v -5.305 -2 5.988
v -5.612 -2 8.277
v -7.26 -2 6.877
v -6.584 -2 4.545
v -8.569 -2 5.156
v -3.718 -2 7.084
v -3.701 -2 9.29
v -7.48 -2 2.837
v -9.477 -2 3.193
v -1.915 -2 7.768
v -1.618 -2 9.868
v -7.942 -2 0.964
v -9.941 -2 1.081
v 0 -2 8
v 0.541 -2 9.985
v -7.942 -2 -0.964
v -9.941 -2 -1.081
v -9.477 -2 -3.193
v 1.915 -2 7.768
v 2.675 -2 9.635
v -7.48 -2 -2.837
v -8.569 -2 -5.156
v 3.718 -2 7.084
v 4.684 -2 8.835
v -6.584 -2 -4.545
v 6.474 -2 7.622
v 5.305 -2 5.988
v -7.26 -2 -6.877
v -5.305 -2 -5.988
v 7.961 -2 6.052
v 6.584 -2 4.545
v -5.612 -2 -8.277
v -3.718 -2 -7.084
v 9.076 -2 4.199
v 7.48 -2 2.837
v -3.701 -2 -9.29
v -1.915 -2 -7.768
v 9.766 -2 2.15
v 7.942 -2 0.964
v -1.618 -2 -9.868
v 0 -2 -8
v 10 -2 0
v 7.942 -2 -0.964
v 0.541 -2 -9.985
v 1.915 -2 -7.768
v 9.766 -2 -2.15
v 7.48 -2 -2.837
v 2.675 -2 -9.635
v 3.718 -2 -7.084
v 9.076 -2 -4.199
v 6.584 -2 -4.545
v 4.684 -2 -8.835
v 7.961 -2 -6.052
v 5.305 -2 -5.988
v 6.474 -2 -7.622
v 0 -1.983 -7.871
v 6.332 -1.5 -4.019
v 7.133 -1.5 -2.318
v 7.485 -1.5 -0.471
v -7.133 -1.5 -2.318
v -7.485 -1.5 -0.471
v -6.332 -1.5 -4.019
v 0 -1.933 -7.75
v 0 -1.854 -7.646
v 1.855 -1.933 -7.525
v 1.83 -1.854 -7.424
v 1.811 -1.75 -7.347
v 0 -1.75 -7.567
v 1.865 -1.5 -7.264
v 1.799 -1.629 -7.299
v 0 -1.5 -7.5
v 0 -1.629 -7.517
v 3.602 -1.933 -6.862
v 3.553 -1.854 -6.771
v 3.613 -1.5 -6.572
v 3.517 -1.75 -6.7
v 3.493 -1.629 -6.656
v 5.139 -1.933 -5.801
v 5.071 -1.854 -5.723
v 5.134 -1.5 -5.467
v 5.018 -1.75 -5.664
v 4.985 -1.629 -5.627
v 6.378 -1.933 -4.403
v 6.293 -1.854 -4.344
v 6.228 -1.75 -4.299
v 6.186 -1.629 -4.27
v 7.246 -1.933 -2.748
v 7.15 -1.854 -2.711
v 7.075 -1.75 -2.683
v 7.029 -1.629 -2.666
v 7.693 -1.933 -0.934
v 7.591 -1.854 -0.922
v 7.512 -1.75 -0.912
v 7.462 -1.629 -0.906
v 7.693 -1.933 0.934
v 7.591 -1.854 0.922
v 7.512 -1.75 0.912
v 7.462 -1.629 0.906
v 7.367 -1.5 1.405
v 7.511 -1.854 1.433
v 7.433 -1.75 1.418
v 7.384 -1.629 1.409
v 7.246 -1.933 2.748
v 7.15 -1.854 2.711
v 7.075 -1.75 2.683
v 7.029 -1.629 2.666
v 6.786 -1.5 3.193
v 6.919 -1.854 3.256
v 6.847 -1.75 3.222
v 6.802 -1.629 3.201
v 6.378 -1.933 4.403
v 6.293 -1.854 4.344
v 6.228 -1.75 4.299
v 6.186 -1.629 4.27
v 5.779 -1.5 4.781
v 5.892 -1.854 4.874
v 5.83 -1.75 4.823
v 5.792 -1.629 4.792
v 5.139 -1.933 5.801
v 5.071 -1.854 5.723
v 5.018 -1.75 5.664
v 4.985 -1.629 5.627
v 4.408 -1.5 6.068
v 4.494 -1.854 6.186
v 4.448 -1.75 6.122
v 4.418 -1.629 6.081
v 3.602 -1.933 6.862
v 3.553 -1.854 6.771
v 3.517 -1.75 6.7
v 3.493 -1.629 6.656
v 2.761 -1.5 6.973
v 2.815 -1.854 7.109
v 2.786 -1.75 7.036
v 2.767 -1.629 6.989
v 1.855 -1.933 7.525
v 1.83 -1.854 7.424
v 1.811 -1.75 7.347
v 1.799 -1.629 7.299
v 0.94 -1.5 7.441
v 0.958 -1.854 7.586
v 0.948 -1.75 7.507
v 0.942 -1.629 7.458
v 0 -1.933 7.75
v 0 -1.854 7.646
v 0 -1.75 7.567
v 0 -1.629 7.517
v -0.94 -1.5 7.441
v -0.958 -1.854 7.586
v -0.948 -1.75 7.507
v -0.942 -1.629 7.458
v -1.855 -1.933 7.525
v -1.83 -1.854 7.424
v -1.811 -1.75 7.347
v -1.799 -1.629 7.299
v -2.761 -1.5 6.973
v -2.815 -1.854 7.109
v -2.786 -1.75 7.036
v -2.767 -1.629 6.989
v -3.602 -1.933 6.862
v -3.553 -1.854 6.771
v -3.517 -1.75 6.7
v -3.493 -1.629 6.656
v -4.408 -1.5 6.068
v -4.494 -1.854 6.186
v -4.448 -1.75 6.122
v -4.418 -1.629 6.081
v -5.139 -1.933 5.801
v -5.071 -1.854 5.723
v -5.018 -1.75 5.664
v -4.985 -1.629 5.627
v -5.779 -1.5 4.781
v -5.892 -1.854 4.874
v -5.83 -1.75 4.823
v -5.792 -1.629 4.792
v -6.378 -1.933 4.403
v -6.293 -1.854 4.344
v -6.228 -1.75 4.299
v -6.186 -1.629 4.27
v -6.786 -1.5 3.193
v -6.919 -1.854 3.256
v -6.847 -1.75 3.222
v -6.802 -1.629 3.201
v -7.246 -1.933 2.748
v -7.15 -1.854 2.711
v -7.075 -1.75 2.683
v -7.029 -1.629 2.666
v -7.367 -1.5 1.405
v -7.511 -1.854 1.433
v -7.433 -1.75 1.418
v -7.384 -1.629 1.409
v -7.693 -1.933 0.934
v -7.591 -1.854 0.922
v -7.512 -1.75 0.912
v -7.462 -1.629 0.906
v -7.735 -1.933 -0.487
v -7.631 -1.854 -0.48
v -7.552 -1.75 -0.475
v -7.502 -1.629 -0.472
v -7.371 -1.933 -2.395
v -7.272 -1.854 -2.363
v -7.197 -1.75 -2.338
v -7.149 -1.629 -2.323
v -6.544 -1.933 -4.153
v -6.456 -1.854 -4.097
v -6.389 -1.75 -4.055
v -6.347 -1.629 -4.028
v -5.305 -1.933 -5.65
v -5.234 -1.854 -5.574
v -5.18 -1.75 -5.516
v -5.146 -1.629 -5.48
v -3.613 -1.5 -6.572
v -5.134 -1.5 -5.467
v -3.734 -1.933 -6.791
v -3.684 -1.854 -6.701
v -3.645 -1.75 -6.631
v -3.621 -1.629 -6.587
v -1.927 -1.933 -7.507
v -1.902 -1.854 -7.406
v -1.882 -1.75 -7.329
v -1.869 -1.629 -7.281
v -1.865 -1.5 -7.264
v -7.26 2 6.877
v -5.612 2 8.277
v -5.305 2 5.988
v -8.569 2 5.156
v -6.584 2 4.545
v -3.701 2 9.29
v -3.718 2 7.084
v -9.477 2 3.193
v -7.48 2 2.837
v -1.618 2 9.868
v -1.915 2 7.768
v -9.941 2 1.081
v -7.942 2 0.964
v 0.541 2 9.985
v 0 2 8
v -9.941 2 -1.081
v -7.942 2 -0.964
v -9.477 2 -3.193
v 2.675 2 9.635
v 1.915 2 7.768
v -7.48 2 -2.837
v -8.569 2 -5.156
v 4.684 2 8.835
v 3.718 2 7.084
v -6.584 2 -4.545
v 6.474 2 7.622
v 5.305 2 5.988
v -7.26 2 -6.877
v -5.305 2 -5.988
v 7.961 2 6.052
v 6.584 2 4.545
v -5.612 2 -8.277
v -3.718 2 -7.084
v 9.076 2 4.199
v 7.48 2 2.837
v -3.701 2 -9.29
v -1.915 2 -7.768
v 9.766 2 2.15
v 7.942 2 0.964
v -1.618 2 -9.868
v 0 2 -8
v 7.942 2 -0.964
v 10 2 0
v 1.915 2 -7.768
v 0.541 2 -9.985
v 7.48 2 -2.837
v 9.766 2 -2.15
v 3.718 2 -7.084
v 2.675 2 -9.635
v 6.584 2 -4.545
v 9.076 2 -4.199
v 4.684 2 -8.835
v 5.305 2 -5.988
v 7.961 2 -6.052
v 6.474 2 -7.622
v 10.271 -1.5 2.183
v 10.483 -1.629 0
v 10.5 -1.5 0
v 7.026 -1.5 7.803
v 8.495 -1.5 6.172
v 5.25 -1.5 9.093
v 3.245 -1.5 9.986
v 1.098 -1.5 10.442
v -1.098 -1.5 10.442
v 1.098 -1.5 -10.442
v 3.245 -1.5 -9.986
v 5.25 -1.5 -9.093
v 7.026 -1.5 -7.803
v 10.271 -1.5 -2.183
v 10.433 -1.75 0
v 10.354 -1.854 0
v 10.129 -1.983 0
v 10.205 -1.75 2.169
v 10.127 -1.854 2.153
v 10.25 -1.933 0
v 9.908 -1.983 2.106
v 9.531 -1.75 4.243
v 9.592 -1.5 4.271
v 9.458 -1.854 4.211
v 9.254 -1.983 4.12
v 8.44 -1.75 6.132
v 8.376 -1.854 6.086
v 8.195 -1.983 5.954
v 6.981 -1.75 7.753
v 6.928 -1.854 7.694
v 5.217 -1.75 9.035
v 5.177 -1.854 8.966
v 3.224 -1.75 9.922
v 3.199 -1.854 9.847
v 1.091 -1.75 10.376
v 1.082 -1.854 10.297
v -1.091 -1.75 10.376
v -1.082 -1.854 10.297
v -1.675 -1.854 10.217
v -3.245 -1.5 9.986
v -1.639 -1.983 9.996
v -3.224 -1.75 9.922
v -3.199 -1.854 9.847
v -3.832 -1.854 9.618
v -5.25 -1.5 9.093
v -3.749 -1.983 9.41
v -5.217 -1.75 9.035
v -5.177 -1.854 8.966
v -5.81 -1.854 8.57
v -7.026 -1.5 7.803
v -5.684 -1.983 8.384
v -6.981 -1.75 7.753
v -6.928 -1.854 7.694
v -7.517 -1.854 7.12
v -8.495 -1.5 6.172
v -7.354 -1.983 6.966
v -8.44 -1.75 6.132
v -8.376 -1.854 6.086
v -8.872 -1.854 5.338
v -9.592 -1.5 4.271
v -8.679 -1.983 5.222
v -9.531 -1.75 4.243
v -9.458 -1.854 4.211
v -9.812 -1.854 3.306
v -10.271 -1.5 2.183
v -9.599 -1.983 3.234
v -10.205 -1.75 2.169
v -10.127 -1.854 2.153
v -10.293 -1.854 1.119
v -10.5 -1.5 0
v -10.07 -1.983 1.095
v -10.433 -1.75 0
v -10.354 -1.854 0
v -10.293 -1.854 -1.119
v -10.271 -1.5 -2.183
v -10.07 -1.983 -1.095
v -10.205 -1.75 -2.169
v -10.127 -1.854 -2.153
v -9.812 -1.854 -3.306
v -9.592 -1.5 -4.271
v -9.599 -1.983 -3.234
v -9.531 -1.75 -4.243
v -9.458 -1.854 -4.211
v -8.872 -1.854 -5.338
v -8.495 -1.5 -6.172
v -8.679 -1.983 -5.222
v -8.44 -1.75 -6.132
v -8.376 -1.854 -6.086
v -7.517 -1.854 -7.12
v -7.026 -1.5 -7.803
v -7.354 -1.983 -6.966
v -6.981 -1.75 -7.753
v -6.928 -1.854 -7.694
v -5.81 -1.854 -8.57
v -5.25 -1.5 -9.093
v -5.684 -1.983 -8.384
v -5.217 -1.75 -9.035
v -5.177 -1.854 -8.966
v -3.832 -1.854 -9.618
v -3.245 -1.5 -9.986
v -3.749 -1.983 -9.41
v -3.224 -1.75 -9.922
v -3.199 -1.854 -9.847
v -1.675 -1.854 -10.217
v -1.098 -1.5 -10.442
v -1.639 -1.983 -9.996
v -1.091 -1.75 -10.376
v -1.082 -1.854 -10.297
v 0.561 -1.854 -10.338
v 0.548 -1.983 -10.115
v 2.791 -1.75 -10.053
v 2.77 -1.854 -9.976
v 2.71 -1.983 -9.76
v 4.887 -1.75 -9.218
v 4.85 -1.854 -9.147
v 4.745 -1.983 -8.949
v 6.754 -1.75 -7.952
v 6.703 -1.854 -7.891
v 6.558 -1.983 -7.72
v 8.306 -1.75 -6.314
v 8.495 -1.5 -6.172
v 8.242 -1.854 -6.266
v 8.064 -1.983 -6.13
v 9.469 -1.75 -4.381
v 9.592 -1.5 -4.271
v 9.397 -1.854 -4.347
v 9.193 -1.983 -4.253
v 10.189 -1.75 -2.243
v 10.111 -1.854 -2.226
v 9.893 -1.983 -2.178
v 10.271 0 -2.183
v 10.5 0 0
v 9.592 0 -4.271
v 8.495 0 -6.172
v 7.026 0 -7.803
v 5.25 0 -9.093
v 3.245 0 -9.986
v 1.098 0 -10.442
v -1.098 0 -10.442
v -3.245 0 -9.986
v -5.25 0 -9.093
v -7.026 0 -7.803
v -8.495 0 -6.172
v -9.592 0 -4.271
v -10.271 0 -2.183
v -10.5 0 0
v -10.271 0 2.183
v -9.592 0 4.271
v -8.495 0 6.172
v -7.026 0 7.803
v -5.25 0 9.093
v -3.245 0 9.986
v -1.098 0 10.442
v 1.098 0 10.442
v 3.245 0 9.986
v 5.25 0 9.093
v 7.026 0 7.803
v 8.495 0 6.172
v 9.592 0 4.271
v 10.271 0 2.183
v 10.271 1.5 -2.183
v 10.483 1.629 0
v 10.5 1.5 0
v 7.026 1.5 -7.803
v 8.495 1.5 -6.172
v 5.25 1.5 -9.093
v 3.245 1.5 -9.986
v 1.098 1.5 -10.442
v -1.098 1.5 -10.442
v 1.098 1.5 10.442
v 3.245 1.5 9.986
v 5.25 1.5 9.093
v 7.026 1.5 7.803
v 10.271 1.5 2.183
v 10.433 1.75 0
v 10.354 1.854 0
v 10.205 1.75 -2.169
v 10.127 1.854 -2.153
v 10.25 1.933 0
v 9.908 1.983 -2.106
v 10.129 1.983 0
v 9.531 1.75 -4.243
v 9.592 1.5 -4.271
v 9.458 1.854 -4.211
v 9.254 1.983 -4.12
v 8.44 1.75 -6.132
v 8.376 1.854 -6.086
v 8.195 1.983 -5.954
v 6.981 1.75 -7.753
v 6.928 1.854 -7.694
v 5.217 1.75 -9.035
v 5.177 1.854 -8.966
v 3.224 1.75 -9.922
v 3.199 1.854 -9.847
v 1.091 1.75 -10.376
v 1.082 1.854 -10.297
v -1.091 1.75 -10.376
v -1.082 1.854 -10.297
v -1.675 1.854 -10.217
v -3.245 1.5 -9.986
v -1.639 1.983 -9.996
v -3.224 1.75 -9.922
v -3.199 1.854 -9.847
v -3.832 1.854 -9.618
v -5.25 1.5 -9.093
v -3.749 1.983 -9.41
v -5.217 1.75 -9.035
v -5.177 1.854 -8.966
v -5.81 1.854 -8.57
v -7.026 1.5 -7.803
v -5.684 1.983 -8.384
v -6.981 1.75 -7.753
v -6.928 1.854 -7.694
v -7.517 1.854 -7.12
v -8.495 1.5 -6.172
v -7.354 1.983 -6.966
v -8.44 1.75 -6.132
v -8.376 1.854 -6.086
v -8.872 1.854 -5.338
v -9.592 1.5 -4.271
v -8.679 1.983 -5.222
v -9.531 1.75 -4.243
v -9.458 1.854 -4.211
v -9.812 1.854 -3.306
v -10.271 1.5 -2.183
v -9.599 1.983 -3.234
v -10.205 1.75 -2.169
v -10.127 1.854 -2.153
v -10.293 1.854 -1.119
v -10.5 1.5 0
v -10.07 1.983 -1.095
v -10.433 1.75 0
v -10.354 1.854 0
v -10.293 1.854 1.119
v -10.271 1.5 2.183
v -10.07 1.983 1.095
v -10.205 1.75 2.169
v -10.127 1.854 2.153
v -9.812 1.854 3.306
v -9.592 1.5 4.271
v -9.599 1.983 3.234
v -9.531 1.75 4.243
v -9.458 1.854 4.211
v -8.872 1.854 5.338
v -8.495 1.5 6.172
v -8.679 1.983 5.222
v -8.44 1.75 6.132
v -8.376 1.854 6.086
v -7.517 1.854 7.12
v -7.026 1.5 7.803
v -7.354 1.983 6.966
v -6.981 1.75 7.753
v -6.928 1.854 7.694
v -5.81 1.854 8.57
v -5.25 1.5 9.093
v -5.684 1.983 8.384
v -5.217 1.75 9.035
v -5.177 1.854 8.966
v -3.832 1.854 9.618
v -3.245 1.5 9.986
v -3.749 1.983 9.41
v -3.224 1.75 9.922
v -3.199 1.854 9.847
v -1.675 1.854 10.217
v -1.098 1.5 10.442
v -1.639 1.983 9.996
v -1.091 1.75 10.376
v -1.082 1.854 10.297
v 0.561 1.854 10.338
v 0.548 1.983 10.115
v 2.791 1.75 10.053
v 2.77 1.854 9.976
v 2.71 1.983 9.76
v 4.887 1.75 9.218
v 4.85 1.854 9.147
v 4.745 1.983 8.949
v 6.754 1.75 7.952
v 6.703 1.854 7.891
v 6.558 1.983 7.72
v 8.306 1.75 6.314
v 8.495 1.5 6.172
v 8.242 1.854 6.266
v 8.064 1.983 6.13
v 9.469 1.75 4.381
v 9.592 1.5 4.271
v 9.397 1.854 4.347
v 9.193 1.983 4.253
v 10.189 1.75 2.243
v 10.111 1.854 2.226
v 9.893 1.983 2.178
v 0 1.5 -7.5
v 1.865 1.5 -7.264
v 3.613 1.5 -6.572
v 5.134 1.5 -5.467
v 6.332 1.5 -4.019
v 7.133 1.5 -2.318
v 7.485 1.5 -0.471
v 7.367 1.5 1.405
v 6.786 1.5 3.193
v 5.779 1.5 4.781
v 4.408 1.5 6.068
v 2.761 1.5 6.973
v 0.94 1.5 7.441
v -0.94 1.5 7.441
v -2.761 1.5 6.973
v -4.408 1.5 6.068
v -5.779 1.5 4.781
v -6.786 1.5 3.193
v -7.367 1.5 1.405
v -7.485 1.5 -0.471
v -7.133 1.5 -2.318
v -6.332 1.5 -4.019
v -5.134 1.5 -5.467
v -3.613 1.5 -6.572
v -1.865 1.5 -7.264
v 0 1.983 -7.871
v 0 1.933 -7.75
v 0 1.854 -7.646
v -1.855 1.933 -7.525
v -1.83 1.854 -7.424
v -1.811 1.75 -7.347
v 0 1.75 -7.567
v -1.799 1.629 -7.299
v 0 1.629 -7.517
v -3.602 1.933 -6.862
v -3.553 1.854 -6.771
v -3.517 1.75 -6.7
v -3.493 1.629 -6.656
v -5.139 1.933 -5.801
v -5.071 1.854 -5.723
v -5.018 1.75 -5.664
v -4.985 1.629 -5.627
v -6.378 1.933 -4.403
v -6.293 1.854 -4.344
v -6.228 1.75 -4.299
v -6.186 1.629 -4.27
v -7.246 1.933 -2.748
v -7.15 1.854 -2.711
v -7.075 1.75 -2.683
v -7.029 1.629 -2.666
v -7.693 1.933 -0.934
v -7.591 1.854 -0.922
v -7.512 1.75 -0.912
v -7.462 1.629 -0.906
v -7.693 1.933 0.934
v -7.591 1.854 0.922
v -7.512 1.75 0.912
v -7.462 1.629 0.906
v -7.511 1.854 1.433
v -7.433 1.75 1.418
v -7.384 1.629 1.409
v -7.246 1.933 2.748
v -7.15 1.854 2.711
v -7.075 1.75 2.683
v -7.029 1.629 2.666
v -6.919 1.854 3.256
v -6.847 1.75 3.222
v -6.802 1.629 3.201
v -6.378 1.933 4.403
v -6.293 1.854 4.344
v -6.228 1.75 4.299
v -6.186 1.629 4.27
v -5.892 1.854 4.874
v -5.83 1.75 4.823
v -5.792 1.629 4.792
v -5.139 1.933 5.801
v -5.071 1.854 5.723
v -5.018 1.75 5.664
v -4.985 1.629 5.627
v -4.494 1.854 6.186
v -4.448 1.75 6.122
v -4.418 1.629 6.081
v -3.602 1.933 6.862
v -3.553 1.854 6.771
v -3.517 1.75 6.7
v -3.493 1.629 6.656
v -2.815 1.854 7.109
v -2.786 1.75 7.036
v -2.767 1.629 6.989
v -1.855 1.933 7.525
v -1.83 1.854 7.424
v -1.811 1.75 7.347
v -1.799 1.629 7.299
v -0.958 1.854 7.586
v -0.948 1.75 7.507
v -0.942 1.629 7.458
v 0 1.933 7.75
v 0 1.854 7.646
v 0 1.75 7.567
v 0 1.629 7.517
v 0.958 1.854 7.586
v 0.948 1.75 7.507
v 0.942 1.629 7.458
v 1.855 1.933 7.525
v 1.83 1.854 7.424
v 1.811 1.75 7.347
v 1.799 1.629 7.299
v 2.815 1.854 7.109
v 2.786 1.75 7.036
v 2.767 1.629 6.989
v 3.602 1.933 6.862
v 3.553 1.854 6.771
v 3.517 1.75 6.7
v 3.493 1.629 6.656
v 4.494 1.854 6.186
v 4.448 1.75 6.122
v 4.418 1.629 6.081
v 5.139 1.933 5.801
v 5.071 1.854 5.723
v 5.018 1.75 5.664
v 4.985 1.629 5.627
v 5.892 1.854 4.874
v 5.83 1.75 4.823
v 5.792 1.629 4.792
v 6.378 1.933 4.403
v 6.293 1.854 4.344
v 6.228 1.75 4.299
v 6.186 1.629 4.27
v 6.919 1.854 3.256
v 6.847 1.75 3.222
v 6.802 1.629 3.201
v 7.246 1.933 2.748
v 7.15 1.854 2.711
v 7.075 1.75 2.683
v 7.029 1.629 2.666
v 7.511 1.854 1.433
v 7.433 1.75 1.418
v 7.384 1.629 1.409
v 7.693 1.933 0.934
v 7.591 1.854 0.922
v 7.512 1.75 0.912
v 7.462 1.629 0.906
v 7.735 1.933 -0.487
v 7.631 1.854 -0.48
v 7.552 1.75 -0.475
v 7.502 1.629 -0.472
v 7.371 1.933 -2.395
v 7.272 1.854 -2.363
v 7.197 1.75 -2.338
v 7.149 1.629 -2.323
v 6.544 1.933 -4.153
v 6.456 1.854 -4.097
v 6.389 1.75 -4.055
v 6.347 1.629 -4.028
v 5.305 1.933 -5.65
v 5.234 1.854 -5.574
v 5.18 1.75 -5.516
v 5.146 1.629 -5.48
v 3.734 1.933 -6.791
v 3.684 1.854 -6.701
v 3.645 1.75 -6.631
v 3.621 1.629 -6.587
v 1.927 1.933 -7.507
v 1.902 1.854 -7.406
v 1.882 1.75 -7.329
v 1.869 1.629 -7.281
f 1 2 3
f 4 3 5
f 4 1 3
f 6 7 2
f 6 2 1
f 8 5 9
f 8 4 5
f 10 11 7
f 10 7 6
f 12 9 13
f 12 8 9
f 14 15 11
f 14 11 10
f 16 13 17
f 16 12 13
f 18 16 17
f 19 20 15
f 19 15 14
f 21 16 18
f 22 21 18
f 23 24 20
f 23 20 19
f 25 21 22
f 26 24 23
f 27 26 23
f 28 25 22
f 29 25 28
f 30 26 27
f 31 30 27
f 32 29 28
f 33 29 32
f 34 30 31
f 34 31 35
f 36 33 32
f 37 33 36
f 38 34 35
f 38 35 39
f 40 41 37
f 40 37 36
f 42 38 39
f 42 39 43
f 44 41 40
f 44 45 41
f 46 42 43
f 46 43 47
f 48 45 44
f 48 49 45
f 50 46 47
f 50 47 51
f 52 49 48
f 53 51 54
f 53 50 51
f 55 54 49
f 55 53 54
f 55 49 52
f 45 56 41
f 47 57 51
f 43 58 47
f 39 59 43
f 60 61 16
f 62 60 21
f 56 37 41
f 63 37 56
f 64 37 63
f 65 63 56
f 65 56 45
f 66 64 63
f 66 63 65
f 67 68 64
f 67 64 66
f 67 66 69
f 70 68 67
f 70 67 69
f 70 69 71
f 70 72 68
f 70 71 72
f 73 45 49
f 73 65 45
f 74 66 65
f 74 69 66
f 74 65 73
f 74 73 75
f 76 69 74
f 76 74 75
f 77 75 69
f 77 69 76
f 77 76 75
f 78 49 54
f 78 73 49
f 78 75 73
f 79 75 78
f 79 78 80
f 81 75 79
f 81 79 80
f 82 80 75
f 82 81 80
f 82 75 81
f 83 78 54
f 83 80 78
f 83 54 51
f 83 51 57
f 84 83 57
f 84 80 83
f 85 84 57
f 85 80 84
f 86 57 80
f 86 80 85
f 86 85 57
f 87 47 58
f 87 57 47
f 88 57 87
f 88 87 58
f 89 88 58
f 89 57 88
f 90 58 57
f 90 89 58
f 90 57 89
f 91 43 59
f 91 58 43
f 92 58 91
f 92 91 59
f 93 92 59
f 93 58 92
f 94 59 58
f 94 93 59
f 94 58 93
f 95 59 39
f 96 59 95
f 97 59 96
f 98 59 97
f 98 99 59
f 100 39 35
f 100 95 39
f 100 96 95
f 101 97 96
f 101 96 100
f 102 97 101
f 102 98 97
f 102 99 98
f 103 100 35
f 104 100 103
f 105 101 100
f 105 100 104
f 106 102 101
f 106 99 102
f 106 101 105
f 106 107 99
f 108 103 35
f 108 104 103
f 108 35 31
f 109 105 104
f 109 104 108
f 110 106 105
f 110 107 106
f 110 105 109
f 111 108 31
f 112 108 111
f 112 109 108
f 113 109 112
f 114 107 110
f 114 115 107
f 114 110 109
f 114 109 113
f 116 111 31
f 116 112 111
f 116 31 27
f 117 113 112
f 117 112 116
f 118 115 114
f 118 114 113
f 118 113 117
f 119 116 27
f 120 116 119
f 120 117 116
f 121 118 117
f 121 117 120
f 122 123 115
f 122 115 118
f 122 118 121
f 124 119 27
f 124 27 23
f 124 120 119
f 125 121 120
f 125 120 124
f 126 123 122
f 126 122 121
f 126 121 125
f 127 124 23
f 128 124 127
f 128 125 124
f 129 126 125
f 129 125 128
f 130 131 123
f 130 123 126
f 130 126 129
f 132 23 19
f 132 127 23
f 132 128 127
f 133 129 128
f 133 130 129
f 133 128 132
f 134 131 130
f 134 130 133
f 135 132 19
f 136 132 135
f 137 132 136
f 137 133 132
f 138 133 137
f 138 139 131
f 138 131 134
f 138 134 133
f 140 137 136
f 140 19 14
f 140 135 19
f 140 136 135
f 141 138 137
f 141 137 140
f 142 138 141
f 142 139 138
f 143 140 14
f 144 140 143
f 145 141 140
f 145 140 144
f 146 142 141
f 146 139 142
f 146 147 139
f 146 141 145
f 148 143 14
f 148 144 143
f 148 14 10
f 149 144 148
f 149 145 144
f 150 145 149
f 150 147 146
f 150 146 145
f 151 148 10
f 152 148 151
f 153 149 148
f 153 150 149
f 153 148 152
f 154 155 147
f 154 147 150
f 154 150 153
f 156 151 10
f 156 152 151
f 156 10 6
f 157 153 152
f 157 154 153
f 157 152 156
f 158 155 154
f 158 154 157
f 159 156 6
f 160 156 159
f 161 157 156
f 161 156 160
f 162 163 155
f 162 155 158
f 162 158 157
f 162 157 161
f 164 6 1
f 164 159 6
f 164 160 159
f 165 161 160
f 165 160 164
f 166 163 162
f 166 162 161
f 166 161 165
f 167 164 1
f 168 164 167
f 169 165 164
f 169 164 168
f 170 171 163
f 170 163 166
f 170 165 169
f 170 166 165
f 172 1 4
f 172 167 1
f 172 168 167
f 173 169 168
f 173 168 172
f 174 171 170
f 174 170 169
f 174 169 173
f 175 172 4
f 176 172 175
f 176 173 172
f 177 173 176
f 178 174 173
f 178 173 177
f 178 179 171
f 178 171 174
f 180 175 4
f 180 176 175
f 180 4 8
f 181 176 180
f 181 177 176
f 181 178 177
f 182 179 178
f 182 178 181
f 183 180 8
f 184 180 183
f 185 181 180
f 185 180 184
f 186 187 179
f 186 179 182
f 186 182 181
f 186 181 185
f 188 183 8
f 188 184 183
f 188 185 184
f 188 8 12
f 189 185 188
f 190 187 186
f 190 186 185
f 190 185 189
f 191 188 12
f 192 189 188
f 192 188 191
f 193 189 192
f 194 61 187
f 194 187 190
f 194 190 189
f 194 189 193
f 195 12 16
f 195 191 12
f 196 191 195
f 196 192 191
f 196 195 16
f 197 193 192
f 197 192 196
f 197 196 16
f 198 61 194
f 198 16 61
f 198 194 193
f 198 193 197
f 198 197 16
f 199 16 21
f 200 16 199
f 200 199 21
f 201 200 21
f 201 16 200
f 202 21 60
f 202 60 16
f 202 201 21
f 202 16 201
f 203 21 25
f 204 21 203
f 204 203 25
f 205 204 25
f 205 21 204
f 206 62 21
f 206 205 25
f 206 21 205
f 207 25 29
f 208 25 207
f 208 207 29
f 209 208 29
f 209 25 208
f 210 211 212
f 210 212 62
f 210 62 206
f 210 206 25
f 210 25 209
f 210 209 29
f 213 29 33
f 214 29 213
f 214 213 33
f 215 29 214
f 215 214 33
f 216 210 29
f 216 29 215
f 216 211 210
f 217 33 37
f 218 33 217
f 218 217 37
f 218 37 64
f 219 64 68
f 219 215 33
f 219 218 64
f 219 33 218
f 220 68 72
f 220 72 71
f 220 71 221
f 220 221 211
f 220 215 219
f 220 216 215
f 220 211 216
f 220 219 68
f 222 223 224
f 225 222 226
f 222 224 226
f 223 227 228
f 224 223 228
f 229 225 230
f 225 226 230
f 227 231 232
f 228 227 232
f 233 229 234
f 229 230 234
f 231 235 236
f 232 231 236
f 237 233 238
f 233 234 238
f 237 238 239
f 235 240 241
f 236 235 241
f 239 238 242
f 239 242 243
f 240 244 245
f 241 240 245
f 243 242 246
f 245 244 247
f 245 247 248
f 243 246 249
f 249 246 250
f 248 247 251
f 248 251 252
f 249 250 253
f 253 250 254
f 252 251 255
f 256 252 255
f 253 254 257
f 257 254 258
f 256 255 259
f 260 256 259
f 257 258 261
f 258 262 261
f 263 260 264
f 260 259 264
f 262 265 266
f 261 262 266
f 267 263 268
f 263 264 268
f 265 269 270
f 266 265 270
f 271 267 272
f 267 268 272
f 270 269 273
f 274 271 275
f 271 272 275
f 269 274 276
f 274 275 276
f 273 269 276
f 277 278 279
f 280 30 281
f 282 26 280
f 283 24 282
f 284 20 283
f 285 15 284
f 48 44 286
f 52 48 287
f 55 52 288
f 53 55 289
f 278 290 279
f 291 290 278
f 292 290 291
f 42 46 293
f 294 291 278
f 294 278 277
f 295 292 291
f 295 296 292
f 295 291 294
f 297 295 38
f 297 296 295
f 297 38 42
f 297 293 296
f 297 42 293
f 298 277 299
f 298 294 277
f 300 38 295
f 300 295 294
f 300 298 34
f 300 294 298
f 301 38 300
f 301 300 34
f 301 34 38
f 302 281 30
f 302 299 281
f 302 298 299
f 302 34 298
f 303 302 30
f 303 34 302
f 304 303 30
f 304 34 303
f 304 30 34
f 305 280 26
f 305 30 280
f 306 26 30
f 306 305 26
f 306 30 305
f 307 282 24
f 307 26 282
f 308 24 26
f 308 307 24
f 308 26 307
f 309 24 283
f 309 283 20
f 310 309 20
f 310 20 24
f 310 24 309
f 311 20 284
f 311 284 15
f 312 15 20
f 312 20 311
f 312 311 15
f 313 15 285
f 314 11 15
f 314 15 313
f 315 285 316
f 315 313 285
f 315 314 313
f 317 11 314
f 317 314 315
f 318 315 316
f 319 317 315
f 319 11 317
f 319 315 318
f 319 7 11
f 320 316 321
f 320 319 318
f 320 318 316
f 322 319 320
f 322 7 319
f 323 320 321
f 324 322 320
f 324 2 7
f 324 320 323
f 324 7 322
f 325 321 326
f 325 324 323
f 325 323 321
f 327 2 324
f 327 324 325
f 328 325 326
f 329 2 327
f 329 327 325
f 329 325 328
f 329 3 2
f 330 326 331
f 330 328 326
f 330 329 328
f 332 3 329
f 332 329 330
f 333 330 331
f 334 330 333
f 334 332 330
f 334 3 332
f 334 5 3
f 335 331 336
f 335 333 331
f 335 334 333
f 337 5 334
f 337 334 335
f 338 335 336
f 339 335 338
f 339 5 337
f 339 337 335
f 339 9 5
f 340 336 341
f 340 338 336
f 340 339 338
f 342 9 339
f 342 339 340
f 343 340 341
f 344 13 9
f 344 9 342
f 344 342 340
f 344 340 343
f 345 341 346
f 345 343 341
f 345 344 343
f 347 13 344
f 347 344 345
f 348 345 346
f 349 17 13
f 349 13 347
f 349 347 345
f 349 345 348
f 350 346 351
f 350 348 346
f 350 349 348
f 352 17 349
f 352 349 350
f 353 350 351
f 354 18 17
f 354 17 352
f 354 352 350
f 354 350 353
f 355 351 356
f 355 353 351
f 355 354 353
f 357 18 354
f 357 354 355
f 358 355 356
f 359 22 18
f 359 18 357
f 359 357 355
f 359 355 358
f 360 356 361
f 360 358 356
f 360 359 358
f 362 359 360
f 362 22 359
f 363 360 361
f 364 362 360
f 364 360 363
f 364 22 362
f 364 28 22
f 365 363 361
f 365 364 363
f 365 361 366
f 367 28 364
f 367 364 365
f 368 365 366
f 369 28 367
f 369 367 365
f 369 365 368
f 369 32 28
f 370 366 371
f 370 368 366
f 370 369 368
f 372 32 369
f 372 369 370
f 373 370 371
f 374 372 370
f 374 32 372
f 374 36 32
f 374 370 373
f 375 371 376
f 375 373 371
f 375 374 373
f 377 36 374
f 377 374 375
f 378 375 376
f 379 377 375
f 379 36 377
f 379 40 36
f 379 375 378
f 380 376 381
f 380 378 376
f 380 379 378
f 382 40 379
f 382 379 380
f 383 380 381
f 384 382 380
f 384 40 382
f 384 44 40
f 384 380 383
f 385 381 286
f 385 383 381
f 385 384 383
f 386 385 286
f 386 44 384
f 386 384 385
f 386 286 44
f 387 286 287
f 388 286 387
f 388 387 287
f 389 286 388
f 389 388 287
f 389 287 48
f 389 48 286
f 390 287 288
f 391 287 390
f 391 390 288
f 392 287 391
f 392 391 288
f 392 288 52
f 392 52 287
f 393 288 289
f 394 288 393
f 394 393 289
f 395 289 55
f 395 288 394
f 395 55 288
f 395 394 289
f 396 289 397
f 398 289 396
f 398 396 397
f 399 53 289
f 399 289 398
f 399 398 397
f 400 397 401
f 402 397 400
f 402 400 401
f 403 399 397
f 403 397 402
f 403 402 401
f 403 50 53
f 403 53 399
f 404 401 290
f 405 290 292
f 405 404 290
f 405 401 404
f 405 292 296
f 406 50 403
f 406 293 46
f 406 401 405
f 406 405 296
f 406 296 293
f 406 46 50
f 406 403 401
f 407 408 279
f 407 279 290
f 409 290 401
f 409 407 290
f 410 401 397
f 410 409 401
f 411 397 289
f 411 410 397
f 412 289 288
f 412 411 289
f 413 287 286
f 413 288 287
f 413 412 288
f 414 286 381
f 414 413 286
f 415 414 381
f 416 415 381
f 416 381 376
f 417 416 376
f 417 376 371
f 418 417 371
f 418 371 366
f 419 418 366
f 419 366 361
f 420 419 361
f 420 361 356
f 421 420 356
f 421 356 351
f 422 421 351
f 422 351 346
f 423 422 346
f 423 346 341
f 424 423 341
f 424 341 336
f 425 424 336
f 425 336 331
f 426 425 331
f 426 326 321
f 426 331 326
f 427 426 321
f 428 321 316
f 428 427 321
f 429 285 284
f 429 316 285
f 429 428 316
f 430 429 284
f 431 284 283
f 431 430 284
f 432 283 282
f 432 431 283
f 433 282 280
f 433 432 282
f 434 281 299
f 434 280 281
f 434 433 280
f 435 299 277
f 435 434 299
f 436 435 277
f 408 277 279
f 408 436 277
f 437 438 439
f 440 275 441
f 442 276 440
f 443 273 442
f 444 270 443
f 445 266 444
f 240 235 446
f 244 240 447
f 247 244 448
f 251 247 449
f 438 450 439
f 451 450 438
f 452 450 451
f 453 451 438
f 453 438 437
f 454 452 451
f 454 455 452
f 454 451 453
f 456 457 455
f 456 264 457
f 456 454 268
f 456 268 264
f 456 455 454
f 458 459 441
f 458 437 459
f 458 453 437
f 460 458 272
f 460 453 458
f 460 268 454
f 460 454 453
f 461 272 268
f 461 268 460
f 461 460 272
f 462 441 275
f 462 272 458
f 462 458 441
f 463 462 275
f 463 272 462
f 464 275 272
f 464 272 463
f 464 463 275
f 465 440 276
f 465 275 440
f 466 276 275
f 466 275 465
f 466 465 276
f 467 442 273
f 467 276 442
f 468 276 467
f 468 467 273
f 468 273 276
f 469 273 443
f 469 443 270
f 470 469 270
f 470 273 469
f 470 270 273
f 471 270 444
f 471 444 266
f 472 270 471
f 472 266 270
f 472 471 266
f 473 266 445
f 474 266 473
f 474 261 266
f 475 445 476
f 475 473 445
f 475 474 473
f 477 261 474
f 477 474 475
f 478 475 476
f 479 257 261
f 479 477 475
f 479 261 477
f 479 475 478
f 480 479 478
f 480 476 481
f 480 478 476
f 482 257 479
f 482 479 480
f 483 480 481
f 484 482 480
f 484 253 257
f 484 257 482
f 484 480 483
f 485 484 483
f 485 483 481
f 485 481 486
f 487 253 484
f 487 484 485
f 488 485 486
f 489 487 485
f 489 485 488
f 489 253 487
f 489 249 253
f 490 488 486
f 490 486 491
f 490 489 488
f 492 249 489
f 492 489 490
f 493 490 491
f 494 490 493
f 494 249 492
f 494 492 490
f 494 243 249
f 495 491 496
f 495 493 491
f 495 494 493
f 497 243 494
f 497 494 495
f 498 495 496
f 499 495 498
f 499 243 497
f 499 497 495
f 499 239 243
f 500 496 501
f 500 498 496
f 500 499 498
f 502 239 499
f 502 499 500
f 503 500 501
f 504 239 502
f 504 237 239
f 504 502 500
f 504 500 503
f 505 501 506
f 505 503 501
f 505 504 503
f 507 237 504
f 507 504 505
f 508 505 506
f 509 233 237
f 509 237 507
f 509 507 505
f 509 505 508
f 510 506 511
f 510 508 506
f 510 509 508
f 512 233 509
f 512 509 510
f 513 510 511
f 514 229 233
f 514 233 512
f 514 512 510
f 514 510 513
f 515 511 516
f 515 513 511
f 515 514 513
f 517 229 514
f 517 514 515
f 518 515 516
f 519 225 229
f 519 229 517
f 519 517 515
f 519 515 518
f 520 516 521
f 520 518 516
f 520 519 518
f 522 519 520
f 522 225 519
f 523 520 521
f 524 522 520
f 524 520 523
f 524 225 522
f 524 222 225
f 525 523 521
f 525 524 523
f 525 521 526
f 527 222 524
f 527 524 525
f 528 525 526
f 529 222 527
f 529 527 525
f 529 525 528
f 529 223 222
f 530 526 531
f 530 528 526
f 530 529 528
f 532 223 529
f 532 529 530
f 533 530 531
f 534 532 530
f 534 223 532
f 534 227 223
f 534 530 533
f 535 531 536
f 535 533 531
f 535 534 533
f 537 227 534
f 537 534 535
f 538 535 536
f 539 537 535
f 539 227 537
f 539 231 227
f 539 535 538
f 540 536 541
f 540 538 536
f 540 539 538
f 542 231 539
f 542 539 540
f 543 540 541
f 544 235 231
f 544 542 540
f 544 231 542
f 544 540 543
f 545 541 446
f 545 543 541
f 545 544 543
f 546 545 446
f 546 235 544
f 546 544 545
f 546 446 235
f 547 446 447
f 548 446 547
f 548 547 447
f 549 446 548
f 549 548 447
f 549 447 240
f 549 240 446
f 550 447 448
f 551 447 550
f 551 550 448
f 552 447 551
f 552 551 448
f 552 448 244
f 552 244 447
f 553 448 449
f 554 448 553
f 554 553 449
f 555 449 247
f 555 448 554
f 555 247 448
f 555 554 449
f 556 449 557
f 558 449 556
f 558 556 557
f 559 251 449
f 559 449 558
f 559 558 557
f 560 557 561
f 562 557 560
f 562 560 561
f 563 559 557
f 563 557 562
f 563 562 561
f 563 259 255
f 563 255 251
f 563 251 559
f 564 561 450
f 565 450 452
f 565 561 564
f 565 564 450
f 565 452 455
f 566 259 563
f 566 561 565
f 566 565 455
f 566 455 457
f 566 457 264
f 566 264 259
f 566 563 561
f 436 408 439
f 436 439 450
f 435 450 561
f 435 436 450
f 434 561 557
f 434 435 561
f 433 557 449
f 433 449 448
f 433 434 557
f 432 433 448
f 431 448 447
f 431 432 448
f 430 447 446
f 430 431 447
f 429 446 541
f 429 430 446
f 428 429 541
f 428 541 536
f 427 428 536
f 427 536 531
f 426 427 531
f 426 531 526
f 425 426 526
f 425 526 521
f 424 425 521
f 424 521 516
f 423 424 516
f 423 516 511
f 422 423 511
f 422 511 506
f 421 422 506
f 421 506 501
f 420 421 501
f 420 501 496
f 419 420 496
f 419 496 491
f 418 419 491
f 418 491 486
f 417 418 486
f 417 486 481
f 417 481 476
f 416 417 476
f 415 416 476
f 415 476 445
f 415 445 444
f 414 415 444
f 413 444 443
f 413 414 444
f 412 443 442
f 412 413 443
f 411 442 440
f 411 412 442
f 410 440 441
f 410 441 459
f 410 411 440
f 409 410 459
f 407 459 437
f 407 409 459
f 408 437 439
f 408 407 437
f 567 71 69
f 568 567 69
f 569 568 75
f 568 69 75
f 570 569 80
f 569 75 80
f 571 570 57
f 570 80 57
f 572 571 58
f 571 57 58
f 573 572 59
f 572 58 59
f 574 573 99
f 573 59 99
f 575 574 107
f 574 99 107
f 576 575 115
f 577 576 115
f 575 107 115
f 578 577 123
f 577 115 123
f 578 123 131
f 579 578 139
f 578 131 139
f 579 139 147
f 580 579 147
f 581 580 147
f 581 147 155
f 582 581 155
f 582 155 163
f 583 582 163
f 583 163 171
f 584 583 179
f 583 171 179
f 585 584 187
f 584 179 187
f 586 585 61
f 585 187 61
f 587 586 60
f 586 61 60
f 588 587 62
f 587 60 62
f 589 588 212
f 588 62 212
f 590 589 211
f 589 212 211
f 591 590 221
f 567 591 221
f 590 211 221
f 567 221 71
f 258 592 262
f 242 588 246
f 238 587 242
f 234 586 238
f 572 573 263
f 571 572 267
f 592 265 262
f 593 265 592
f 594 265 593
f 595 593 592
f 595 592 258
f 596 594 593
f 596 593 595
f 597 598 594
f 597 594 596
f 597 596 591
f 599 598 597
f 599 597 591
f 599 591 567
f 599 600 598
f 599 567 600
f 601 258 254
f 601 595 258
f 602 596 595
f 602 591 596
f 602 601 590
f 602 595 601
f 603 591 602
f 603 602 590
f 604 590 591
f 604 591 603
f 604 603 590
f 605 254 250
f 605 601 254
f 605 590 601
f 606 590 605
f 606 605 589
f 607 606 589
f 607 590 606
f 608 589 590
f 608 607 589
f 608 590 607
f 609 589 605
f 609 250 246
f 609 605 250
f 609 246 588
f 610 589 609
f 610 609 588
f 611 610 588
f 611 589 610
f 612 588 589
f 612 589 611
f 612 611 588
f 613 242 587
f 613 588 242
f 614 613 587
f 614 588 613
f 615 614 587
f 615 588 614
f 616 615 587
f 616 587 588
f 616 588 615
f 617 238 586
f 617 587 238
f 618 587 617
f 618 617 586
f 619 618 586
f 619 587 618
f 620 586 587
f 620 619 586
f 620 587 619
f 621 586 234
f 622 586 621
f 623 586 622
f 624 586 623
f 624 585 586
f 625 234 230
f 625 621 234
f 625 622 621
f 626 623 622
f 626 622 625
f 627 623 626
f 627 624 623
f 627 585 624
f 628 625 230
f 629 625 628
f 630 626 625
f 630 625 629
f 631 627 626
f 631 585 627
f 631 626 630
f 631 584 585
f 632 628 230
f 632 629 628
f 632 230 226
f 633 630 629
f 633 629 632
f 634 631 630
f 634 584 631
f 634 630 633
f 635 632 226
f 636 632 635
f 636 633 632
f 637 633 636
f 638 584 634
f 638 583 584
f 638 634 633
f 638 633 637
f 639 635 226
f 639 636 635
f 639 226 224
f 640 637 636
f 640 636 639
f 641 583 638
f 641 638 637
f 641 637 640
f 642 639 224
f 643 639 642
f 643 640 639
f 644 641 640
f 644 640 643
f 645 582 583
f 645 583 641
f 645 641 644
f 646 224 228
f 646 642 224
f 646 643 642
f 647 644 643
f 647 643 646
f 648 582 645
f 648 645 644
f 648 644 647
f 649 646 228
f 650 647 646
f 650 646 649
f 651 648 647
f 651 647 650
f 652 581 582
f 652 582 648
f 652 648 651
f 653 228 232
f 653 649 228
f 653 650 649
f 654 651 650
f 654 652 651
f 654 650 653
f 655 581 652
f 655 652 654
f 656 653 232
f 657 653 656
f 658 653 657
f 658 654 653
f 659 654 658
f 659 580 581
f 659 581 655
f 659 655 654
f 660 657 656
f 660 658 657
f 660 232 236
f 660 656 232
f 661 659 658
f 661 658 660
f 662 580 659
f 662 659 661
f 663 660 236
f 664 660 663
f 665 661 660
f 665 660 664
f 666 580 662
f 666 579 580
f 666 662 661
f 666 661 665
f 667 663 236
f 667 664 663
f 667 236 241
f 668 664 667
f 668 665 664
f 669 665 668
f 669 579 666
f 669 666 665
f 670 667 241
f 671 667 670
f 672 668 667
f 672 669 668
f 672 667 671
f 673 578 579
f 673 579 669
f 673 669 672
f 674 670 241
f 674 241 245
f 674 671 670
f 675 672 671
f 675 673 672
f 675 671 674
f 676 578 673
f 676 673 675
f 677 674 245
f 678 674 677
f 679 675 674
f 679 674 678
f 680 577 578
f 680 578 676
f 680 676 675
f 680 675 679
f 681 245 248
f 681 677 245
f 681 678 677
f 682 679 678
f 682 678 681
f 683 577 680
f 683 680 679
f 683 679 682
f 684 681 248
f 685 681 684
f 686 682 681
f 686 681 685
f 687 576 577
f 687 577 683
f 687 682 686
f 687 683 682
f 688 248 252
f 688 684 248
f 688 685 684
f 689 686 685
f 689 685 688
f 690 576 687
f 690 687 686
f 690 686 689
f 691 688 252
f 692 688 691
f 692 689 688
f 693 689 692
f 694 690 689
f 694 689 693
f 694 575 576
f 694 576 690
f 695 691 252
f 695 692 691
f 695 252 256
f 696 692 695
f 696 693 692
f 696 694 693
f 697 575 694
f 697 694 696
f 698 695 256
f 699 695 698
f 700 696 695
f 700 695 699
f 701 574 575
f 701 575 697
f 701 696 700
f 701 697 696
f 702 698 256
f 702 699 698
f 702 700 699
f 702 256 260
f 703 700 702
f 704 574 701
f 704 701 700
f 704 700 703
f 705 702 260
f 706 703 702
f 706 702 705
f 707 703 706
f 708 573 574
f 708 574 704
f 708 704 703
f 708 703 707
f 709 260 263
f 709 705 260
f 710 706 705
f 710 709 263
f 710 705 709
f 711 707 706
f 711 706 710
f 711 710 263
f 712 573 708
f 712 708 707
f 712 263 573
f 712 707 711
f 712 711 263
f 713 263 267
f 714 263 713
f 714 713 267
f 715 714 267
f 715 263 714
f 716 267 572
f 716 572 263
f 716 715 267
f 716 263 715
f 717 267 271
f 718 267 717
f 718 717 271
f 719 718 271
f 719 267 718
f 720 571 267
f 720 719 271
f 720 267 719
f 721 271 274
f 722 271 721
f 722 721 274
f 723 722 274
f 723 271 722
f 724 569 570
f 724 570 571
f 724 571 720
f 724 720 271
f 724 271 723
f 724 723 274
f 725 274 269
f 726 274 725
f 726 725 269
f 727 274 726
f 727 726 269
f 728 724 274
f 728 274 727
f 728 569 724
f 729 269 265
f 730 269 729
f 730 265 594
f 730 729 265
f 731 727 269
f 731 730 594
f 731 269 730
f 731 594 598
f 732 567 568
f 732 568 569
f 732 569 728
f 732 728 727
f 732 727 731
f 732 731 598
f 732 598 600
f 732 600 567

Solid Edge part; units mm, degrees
sketch "Sketch1" plane through (0, 0, 0) normal (0, -1, 0) x (1, 0, 0)
  circle A0 centre (0, 0) radius 10.5
  dimension "D1" = 21
extrude "Protrusion1" add sketch "Sketch1" along normal mid plane 4
hole "Bohrung_1" at (0, -2, 0) direction (0, 1, 0) diameter 15 end up to next
fillet "Verrundung_1" radius 0.5 4 edges at (-10.5, -2, 0) (-10.5, 2, 0) (-7.5, -2, 0) (0, 2, -7.5)
properties material "Aluminium, 1060"
